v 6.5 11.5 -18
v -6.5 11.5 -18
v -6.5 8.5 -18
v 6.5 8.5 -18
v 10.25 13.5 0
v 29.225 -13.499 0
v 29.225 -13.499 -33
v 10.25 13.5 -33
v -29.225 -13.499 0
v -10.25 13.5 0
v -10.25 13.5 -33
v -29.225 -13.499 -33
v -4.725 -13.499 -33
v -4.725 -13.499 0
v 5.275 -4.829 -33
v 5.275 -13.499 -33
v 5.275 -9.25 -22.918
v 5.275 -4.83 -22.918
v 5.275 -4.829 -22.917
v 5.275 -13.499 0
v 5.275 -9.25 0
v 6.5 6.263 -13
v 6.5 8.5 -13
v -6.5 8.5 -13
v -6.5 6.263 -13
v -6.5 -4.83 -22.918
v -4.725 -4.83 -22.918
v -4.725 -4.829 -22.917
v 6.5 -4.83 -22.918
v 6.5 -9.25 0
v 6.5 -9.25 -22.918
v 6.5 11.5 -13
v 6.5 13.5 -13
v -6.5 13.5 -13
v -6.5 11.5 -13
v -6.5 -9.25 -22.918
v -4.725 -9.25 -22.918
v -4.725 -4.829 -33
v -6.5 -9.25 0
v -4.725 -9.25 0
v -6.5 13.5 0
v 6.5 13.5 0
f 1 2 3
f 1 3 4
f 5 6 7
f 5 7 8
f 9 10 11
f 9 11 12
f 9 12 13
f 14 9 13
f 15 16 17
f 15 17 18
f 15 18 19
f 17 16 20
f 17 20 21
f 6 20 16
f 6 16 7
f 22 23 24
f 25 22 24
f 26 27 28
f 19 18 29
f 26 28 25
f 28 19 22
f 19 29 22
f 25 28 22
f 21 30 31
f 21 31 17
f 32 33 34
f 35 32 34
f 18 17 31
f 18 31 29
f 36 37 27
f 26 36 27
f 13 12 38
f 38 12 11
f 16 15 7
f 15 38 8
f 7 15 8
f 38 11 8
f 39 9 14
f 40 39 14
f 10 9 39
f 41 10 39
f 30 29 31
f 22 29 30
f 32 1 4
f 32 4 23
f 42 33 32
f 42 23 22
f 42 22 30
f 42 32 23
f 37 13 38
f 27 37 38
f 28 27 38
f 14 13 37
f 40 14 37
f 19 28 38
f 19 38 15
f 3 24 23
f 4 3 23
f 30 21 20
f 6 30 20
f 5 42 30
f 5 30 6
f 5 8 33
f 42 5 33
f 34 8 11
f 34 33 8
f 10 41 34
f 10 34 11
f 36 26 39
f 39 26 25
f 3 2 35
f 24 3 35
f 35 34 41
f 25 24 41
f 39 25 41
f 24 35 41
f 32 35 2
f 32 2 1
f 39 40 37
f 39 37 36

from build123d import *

# Parameters (mm, degrees)
F1_DEPTH  = 33
F2_W      = 13
F2_H      = 13
F3_DEPTH  = 22.75
F4_W      = 10
F4_H      = 8.67
F5_DEPTH  = 33
F6_W      = 13
F6_H      = 3
F7_DEPTH  = 5
F9_DEPTH  = 6.5
F10_DEPTH = 6.5


with BuildPart() as f1:
    # F0 (on Top) → F1 (new body)
    with BuildSketch(Plane.XY):
        Polygon((-10.25, 13.49995), (-29.225, -13.498744), (29.225, -13.498744), (10.25, 13.49995), align=None)
    extrude(amount=-F1_DEPTH)

    # F2 (on face) → F3 (cut)
    with BuildSketch(Plane(origin=(0, 13.49995, 0), x_dir=(-1, 0, 0), z_dir=(0, 1, 0))):
        with Locations((0, -6.5)):
            Rectangle(F2_W, F2_H)
    extrude(amount=-F3_DEPTH, mode=Mode.SUBTRACT)

    # F4 (on face) → F5 (cut)
    with BuildSketch(Plane.XY):
        with Locations((0.275, -9.163744)):
            Rectangle(F4_W, F4_H)
    extrude(amount=-F5_DEPTH, mode=Mode.SUBTRACT)

    # F6 (on face) → F7 (cut)
    with BuildSketch(Plane.XY.offset(-13)):
        with Locations((0, 9.99995)):
            Rectangle(F6_W, F6_H)
    extrude(amount=-F7_DEPTH, mode=Mode.SUBTRACT)

    # F8 (on Right) → F9 (cut)
    with BuildSketch(Plane.YZ):
        Polygon((-4.83005, -22.918396), (8.49995, -11), (-9.25005, -11), (-9.25005, -22.918396), align=None)
    extrude(amount=-F9_DEPTH, mode=Mode.SUBTRACT)

    # F8 (on Right) → F10 (cut)
    with BuildSketch(Plane.YZ):
        Polygon((-4.83005, -22.918396), (8.49995, -11), (-9.25005, -11), (-9.25005, -22.918396), align=None)
    extrude(amount=F10_DEPTH, mode=Mode.SUBTRACT)


solid = f1.part
